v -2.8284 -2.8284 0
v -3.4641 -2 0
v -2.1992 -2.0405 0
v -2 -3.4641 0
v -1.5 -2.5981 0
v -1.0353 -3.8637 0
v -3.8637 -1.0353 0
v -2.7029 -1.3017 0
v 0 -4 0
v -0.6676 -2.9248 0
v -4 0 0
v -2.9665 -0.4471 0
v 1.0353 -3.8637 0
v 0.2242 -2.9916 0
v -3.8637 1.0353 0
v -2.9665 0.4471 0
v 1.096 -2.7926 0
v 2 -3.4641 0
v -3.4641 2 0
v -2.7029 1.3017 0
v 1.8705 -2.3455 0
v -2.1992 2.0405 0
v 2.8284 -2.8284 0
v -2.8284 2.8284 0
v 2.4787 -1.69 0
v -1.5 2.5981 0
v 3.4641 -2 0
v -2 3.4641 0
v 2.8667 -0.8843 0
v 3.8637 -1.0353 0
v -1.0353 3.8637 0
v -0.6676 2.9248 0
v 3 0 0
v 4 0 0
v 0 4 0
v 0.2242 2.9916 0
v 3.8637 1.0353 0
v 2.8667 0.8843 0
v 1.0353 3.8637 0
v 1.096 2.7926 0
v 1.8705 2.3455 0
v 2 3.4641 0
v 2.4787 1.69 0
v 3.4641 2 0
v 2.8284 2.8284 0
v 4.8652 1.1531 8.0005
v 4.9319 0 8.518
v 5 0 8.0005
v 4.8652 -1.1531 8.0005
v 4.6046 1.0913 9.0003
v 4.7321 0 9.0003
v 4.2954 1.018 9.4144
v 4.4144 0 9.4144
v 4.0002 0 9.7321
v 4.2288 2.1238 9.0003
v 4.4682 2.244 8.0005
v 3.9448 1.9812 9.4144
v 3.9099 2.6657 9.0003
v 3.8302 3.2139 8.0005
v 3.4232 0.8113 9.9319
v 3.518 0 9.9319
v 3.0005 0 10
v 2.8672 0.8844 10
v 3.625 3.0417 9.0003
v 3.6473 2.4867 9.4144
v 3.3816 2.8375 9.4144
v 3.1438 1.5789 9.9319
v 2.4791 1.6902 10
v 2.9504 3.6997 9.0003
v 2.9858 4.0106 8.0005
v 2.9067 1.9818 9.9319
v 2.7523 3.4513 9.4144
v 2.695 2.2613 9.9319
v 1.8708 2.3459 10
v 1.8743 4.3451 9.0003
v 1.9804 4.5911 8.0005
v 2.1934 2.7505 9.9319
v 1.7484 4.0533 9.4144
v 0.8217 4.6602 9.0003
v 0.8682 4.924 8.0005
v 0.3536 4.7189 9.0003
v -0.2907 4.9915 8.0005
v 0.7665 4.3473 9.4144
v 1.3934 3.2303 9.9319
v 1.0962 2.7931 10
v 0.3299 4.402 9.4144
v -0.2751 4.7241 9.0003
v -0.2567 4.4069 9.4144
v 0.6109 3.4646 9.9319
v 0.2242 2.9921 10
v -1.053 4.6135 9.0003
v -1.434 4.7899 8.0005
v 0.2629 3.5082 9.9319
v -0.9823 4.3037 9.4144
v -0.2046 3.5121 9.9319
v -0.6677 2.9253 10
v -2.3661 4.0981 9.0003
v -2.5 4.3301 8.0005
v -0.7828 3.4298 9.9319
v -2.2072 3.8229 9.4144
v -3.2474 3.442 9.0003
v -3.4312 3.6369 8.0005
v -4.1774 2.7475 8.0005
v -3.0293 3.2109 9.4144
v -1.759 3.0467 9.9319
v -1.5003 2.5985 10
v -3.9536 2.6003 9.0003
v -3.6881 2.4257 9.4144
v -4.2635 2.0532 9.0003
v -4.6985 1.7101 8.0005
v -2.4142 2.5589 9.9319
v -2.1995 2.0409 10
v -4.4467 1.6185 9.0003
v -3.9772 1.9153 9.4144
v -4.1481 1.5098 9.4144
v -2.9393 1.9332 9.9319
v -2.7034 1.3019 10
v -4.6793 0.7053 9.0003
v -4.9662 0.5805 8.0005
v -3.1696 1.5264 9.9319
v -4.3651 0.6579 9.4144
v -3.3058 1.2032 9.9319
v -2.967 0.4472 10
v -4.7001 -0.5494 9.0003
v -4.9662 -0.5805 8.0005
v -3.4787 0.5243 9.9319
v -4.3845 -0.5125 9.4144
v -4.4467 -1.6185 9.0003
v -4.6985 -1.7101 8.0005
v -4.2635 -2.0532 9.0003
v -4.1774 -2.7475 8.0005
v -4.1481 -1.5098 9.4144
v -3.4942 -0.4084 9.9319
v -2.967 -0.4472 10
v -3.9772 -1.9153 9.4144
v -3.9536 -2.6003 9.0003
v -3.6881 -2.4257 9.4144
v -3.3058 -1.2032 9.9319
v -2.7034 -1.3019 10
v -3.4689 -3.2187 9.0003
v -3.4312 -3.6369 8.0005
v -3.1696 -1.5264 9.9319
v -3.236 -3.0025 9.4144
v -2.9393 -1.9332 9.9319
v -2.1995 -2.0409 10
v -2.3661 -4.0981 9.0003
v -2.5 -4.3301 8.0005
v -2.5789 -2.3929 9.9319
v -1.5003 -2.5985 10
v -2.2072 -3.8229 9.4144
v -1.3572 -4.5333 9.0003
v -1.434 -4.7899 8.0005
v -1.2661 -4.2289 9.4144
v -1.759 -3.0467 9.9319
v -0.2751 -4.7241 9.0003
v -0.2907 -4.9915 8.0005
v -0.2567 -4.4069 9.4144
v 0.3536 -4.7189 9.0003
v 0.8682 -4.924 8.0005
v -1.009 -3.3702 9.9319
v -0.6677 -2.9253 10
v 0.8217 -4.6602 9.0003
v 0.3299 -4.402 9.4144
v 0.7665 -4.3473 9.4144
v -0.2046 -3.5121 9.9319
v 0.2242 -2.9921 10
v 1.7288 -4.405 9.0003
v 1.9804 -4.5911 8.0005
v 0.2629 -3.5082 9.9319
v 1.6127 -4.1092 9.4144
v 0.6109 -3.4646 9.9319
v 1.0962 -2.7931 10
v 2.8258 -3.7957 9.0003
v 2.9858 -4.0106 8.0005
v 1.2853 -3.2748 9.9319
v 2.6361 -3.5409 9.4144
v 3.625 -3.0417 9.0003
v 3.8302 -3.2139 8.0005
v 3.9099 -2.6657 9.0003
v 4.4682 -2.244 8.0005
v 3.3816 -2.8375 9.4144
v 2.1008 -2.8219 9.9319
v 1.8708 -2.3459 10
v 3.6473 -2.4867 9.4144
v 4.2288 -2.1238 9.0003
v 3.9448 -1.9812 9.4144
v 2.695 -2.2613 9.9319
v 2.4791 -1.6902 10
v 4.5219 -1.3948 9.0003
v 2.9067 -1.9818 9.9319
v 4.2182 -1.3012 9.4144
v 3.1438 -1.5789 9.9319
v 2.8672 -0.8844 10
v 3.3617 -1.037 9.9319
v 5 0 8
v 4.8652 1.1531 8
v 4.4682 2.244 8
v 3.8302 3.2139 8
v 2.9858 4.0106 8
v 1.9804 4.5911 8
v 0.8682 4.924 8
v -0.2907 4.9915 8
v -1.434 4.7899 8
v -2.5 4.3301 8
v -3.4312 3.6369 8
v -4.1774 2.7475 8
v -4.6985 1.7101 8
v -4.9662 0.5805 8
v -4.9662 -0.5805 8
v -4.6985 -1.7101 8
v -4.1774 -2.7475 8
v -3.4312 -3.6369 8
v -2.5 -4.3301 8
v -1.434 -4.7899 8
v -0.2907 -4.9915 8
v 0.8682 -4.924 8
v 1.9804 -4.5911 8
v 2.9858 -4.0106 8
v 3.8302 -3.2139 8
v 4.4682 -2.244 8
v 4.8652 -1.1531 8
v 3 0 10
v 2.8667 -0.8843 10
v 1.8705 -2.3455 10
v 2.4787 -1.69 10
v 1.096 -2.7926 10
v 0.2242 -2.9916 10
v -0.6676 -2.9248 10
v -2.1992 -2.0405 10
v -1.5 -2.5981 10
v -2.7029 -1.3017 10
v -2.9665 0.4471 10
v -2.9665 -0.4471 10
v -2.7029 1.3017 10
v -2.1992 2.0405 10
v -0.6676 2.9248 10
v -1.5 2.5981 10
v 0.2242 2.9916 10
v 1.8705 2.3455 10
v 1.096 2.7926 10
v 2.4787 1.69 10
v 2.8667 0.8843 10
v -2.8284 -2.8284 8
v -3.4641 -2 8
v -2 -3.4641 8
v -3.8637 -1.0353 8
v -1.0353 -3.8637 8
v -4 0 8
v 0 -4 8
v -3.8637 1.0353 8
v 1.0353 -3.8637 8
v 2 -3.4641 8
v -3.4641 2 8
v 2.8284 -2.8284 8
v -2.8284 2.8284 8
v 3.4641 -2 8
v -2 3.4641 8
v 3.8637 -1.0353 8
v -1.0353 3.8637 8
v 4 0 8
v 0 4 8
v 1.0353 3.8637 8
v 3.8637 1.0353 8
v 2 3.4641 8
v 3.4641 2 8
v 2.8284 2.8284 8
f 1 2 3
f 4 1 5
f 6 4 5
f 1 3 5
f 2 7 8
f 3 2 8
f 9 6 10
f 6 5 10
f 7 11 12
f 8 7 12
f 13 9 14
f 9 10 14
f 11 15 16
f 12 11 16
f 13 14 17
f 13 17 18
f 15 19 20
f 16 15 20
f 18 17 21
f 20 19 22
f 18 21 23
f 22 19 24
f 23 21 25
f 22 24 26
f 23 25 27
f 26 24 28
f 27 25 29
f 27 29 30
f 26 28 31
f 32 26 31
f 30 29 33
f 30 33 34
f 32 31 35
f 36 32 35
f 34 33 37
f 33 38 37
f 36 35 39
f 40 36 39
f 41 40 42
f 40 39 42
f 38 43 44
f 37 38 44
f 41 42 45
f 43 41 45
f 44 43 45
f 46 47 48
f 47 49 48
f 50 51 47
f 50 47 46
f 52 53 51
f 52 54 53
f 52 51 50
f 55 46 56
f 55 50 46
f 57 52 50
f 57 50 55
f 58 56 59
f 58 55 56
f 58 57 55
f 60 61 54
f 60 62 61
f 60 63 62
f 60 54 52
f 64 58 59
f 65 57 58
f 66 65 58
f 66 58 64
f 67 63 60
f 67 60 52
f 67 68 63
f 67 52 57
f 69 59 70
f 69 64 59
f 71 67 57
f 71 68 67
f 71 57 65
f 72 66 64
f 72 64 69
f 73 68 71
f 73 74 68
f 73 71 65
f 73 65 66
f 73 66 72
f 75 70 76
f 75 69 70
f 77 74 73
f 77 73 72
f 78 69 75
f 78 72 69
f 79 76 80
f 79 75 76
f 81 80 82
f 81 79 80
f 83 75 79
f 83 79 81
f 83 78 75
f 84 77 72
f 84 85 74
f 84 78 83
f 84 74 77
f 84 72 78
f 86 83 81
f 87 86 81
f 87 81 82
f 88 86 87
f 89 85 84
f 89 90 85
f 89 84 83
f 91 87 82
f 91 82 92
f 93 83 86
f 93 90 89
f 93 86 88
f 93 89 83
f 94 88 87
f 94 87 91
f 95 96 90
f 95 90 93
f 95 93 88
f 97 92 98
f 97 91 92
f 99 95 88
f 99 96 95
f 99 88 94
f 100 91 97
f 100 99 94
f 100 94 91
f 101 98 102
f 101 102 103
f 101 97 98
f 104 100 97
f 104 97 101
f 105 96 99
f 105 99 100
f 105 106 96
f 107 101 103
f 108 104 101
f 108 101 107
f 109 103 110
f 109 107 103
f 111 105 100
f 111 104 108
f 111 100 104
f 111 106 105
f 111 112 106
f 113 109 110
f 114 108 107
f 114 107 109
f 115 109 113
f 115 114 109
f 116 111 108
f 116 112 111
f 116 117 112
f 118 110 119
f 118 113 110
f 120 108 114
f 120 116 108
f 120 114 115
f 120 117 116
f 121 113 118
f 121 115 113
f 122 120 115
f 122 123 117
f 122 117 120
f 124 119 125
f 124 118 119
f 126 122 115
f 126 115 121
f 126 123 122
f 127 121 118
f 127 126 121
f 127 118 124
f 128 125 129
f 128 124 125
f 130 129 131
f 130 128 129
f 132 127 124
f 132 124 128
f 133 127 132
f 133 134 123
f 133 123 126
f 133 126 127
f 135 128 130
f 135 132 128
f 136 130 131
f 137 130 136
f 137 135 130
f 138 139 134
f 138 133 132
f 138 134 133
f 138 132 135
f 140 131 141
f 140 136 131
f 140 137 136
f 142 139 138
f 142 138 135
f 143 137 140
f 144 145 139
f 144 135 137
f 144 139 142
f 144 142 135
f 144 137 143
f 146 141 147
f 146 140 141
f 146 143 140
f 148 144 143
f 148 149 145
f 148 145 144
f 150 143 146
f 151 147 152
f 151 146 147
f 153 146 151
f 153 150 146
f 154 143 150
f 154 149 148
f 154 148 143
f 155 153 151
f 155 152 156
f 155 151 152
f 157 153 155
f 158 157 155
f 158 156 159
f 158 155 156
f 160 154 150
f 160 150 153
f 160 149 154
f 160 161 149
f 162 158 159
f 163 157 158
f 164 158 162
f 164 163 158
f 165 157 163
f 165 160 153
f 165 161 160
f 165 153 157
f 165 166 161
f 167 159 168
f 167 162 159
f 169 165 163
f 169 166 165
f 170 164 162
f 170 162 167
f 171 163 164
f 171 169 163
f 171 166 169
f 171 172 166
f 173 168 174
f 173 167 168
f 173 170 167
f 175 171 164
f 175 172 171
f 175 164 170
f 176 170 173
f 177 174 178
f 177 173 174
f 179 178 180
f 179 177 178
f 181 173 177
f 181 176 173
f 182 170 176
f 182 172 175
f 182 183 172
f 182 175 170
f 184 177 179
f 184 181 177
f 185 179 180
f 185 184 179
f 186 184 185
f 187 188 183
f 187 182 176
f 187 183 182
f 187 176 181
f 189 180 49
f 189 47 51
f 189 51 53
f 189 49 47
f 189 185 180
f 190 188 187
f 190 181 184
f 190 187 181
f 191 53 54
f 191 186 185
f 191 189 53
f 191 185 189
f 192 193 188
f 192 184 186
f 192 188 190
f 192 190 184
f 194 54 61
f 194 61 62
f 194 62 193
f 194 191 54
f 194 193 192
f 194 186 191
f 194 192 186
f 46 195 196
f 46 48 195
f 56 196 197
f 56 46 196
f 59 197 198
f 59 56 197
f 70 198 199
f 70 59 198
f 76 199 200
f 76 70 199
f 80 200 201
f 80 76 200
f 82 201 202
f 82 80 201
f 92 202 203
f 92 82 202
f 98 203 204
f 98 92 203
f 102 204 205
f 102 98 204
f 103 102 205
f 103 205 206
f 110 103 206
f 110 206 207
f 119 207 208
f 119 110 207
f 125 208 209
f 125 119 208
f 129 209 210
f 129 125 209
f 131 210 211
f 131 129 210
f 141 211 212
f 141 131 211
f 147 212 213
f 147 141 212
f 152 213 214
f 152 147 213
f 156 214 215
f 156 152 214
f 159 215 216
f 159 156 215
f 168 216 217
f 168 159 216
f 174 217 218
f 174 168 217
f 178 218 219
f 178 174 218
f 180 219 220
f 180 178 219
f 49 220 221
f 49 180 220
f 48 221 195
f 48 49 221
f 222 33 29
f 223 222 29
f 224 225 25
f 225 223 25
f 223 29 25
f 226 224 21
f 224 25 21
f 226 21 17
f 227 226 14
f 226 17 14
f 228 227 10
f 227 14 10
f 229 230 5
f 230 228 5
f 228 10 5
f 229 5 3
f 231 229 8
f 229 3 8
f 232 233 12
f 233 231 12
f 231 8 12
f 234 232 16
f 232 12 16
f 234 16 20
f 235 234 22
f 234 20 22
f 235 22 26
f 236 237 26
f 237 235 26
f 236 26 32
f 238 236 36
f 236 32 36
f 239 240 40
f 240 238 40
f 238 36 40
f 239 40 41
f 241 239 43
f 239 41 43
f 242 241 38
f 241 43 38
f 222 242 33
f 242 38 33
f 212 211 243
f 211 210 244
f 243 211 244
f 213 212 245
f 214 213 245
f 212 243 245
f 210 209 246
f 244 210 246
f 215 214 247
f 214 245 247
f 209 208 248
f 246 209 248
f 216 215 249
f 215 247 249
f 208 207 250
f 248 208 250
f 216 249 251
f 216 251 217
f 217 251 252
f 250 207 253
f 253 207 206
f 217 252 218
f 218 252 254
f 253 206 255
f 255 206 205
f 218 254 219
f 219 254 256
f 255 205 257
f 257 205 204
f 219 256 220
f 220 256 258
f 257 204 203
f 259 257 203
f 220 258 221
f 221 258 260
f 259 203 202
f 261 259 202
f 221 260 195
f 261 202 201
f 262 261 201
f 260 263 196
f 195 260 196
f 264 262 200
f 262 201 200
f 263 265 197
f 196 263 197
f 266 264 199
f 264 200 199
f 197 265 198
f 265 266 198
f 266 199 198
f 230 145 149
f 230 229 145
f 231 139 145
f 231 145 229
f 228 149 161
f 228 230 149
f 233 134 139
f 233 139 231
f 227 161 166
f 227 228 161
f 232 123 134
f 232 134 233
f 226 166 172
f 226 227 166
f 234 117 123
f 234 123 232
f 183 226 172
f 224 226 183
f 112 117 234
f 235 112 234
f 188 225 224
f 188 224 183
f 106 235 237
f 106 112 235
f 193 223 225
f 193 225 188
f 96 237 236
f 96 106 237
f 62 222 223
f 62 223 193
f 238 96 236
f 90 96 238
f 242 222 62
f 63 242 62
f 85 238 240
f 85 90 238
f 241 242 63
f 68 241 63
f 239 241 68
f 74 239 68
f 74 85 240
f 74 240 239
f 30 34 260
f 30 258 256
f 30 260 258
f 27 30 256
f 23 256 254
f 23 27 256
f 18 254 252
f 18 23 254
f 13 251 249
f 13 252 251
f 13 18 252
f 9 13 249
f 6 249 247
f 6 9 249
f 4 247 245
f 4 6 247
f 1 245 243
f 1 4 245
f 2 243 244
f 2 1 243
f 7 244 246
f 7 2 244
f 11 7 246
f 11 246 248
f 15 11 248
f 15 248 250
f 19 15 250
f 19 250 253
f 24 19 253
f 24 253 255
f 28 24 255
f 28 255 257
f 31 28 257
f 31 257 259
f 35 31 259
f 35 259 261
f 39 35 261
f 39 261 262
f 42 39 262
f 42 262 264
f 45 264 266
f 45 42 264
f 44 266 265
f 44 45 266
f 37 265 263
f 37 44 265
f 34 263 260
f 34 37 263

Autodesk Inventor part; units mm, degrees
ref_plane "YZ Plane" through (0, 0, 0) normal (1, 0, 0) x (0, 1, 0)
ref_plane "XZ Plane" through (0, 0, 0) normal (0, 1, 0) x (-1, 0, 0)
ref_plane "XY Plane" through (0, 0, 0) normal (0, 0, 1) x (1, 0, 0)
sketch "Эскиз1" plane through (0, 0, 0) normal (0, 0, 1) x (1, 0, 0)
  circle A0 centre (0, 0) radius 3
  circle A1 centre (0, 0) radius 4
  dimension "d0" = 6
  dimension "d1" = 8
extrude "Выдавливание1" add sketch "Эскиз1" along normal blind 10
sketch "Эскиз2" plane through (0, 0, 10) normal (0, 0, 1) x (1, 0, 0)
  circle A0 centre (0, 0) radius 5
  circle A1 centre (0, 0) radius 4 projected
  dimension "d4" = 10
extrude "Выдавливание2" add sketch "Эскиз2" against normal blind 2
fillet "Сопряжение1" radius 2 1 edges at (-5, 0, 10)
properties part number "hole_small" material "Латунь"
